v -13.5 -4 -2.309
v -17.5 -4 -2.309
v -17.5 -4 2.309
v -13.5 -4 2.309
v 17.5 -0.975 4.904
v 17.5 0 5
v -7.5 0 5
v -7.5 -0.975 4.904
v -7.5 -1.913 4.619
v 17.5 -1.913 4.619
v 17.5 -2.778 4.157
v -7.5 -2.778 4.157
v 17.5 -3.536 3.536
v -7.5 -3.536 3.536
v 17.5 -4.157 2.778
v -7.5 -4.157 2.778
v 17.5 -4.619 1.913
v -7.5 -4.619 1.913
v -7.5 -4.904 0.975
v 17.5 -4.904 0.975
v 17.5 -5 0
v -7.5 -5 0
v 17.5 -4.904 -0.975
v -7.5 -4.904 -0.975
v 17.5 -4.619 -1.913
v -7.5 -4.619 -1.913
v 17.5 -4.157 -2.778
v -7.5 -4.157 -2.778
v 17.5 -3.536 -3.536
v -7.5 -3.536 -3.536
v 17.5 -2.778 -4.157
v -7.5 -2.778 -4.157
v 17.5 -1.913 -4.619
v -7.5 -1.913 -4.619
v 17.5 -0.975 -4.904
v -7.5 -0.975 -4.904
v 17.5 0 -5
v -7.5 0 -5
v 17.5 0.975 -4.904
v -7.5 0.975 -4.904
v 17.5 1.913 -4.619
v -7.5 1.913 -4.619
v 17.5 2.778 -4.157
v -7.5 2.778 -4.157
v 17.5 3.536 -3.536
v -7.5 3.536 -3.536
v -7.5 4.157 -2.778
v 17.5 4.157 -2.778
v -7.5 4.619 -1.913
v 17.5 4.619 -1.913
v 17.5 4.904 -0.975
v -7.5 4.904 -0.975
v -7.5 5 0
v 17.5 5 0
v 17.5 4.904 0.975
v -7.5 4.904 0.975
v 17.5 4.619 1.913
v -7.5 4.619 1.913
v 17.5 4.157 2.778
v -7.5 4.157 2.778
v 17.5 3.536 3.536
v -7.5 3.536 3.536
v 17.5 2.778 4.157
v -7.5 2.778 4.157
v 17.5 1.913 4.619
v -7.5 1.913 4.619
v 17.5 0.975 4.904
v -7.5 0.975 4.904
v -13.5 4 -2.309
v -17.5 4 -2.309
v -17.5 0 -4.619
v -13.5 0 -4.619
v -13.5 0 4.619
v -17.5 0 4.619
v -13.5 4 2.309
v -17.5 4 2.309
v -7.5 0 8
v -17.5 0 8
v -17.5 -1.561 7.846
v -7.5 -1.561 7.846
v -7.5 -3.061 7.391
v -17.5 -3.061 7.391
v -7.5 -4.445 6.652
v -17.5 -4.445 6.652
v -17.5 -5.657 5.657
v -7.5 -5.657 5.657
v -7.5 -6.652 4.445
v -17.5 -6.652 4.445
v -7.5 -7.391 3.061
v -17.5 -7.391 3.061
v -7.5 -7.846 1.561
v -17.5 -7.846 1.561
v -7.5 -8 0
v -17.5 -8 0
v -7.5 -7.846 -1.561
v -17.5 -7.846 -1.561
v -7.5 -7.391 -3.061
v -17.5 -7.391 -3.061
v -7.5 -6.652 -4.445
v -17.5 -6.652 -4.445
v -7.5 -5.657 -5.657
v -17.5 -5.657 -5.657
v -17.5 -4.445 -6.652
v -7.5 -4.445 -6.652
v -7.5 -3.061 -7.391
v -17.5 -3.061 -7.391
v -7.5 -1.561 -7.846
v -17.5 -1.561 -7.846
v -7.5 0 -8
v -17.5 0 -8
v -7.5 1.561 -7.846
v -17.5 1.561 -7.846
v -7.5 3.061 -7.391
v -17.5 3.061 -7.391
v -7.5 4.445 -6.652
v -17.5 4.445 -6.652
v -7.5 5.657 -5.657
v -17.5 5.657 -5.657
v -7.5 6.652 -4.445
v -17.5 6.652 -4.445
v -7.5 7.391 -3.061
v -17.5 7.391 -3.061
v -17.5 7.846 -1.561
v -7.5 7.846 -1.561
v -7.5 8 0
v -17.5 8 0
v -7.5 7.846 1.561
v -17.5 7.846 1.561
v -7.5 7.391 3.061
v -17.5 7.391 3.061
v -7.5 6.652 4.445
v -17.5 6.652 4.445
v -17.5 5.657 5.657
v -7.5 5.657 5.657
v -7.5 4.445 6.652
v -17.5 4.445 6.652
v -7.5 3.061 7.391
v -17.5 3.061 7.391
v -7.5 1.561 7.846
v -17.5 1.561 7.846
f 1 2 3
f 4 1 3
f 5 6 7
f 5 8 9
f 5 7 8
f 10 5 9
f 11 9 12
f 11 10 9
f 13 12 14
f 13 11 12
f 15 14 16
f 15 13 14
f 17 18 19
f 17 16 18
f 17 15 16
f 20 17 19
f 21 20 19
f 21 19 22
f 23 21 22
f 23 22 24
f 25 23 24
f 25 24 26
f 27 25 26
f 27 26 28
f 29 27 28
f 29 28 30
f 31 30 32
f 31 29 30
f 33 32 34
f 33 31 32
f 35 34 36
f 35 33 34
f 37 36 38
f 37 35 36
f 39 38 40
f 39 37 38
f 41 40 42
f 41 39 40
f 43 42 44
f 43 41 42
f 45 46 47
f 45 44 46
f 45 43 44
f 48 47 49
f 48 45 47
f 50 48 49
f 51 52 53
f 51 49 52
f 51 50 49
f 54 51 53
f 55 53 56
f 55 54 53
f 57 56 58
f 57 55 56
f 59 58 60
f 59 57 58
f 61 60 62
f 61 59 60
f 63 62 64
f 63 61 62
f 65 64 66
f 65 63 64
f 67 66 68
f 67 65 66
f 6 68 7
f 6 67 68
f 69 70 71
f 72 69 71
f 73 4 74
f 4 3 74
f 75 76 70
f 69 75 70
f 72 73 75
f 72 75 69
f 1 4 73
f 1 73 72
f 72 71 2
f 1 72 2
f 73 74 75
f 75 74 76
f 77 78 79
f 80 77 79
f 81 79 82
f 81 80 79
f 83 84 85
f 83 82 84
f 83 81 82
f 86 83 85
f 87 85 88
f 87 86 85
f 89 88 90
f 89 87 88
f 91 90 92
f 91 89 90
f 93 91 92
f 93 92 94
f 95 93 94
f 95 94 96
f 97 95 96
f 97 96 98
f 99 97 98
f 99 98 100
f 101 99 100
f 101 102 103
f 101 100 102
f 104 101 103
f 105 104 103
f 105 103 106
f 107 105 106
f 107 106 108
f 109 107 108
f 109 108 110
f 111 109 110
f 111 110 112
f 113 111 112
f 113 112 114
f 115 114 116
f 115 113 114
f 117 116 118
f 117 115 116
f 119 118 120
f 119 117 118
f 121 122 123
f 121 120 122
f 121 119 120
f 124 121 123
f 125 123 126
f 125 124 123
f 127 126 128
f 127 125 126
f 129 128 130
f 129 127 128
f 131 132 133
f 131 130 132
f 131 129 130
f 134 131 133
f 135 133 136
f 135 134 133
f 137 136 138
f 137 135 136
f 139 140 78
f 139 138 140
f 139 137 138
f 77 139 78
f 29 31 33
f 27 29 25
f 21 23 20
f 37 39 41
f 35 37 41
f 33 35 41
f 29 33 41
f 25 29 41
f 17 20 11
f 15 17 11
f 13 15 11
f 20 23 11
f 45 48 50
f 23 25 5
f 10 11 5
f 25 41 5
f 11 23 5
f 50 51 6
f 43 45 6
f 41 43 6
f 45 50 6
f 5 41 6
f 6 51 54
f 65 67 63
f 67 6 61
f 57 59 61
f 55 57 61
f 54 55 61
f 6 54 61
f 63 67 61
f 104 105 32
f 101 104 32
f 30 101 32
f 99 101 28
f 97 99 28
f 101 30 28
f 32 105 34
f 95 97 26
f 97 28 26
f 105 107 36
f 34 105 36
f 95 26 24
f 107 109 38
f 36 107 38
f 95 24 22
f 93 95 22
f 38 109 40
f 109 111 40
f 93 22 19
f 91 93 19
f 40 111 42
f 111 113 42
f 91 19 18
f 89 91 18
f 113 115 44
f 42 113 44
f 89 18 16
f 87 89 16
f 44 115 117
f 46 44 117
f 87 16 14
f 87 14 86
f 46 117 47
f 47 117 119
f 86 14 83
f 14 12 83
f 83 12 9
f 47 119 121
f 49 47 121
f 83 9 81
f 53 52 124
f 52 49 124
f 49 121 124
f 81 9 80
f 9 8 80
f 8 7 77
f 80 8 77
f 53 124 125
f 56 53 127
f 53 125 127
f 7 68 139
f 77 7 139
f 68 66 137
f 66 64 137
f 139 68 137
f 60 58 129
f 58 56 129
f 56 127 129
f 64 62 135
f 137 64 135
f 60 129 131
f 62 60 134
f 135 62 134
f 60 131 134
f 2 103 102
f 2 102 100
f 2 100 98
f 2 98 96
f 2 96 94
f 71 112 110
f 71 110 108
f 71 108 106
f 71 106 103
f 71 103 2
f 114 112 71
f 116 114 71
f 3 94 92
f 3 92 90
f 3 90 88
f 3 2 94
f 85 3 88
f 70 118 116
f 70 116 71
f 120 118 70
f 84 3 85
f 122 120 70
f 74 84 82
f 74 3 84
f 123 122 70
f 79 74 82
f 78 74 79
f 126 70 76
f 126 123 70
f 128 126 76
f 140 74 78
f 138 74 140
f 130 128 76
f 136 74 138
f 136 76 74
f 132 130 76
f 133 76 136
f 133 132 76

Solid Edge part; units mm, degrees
sketch "Sketch1" plane through (10.8674, 0, 10.8674) normal (0, -1, 0) x (1, 0, 0)
  line L0 (-28.3674, -10.8674) -> (-28.3674, -2.8674)
  line L1 (-28.3674, -2.8674) -> (-18.3674, -2.8674)
  line L2 (-18.3674, -2.8674) -> (-18.3674, -5.8674)
  line L3 (-18.3674, -5.8674) -> (6.6326, -5.8674)
  line L4 (6.6326, -5.8674) -> (6.6326, -10.8674)
  dimension "D1" = 10
  dimension "D2" = 25
revolve "RevolvedProtrusion1" add sketch "Sketch1" angle 360 about axis through (16.5, 0, 0) along (-1, 0, 0)
sketch "Sketch2" plane through (-17.5, 0, 0) normal (-1, 0, 0) x (0, 0, -1)
  line L0 (4.6188, 0) -> (2.3094, 4)
  line L1 (2.3094, 4) -> (-2.3094, 4)
  line L2 (-2.3094, 4) -> (-4.6188, 0)
  line L3 (-4.6188, 0) -> (-2.3094, -4)
  line L4 (-2.3094, -4) -> (2.3094, -4)
  line L5 (2.3094, -4) -> (4.6188, 0)
  dimension "D1" = 8
extrude "Cutout1" cut sketch "Sketch2" against normal blind 4
cosmetic_thread "Thread1" size "M10"
properties material "Steel"
